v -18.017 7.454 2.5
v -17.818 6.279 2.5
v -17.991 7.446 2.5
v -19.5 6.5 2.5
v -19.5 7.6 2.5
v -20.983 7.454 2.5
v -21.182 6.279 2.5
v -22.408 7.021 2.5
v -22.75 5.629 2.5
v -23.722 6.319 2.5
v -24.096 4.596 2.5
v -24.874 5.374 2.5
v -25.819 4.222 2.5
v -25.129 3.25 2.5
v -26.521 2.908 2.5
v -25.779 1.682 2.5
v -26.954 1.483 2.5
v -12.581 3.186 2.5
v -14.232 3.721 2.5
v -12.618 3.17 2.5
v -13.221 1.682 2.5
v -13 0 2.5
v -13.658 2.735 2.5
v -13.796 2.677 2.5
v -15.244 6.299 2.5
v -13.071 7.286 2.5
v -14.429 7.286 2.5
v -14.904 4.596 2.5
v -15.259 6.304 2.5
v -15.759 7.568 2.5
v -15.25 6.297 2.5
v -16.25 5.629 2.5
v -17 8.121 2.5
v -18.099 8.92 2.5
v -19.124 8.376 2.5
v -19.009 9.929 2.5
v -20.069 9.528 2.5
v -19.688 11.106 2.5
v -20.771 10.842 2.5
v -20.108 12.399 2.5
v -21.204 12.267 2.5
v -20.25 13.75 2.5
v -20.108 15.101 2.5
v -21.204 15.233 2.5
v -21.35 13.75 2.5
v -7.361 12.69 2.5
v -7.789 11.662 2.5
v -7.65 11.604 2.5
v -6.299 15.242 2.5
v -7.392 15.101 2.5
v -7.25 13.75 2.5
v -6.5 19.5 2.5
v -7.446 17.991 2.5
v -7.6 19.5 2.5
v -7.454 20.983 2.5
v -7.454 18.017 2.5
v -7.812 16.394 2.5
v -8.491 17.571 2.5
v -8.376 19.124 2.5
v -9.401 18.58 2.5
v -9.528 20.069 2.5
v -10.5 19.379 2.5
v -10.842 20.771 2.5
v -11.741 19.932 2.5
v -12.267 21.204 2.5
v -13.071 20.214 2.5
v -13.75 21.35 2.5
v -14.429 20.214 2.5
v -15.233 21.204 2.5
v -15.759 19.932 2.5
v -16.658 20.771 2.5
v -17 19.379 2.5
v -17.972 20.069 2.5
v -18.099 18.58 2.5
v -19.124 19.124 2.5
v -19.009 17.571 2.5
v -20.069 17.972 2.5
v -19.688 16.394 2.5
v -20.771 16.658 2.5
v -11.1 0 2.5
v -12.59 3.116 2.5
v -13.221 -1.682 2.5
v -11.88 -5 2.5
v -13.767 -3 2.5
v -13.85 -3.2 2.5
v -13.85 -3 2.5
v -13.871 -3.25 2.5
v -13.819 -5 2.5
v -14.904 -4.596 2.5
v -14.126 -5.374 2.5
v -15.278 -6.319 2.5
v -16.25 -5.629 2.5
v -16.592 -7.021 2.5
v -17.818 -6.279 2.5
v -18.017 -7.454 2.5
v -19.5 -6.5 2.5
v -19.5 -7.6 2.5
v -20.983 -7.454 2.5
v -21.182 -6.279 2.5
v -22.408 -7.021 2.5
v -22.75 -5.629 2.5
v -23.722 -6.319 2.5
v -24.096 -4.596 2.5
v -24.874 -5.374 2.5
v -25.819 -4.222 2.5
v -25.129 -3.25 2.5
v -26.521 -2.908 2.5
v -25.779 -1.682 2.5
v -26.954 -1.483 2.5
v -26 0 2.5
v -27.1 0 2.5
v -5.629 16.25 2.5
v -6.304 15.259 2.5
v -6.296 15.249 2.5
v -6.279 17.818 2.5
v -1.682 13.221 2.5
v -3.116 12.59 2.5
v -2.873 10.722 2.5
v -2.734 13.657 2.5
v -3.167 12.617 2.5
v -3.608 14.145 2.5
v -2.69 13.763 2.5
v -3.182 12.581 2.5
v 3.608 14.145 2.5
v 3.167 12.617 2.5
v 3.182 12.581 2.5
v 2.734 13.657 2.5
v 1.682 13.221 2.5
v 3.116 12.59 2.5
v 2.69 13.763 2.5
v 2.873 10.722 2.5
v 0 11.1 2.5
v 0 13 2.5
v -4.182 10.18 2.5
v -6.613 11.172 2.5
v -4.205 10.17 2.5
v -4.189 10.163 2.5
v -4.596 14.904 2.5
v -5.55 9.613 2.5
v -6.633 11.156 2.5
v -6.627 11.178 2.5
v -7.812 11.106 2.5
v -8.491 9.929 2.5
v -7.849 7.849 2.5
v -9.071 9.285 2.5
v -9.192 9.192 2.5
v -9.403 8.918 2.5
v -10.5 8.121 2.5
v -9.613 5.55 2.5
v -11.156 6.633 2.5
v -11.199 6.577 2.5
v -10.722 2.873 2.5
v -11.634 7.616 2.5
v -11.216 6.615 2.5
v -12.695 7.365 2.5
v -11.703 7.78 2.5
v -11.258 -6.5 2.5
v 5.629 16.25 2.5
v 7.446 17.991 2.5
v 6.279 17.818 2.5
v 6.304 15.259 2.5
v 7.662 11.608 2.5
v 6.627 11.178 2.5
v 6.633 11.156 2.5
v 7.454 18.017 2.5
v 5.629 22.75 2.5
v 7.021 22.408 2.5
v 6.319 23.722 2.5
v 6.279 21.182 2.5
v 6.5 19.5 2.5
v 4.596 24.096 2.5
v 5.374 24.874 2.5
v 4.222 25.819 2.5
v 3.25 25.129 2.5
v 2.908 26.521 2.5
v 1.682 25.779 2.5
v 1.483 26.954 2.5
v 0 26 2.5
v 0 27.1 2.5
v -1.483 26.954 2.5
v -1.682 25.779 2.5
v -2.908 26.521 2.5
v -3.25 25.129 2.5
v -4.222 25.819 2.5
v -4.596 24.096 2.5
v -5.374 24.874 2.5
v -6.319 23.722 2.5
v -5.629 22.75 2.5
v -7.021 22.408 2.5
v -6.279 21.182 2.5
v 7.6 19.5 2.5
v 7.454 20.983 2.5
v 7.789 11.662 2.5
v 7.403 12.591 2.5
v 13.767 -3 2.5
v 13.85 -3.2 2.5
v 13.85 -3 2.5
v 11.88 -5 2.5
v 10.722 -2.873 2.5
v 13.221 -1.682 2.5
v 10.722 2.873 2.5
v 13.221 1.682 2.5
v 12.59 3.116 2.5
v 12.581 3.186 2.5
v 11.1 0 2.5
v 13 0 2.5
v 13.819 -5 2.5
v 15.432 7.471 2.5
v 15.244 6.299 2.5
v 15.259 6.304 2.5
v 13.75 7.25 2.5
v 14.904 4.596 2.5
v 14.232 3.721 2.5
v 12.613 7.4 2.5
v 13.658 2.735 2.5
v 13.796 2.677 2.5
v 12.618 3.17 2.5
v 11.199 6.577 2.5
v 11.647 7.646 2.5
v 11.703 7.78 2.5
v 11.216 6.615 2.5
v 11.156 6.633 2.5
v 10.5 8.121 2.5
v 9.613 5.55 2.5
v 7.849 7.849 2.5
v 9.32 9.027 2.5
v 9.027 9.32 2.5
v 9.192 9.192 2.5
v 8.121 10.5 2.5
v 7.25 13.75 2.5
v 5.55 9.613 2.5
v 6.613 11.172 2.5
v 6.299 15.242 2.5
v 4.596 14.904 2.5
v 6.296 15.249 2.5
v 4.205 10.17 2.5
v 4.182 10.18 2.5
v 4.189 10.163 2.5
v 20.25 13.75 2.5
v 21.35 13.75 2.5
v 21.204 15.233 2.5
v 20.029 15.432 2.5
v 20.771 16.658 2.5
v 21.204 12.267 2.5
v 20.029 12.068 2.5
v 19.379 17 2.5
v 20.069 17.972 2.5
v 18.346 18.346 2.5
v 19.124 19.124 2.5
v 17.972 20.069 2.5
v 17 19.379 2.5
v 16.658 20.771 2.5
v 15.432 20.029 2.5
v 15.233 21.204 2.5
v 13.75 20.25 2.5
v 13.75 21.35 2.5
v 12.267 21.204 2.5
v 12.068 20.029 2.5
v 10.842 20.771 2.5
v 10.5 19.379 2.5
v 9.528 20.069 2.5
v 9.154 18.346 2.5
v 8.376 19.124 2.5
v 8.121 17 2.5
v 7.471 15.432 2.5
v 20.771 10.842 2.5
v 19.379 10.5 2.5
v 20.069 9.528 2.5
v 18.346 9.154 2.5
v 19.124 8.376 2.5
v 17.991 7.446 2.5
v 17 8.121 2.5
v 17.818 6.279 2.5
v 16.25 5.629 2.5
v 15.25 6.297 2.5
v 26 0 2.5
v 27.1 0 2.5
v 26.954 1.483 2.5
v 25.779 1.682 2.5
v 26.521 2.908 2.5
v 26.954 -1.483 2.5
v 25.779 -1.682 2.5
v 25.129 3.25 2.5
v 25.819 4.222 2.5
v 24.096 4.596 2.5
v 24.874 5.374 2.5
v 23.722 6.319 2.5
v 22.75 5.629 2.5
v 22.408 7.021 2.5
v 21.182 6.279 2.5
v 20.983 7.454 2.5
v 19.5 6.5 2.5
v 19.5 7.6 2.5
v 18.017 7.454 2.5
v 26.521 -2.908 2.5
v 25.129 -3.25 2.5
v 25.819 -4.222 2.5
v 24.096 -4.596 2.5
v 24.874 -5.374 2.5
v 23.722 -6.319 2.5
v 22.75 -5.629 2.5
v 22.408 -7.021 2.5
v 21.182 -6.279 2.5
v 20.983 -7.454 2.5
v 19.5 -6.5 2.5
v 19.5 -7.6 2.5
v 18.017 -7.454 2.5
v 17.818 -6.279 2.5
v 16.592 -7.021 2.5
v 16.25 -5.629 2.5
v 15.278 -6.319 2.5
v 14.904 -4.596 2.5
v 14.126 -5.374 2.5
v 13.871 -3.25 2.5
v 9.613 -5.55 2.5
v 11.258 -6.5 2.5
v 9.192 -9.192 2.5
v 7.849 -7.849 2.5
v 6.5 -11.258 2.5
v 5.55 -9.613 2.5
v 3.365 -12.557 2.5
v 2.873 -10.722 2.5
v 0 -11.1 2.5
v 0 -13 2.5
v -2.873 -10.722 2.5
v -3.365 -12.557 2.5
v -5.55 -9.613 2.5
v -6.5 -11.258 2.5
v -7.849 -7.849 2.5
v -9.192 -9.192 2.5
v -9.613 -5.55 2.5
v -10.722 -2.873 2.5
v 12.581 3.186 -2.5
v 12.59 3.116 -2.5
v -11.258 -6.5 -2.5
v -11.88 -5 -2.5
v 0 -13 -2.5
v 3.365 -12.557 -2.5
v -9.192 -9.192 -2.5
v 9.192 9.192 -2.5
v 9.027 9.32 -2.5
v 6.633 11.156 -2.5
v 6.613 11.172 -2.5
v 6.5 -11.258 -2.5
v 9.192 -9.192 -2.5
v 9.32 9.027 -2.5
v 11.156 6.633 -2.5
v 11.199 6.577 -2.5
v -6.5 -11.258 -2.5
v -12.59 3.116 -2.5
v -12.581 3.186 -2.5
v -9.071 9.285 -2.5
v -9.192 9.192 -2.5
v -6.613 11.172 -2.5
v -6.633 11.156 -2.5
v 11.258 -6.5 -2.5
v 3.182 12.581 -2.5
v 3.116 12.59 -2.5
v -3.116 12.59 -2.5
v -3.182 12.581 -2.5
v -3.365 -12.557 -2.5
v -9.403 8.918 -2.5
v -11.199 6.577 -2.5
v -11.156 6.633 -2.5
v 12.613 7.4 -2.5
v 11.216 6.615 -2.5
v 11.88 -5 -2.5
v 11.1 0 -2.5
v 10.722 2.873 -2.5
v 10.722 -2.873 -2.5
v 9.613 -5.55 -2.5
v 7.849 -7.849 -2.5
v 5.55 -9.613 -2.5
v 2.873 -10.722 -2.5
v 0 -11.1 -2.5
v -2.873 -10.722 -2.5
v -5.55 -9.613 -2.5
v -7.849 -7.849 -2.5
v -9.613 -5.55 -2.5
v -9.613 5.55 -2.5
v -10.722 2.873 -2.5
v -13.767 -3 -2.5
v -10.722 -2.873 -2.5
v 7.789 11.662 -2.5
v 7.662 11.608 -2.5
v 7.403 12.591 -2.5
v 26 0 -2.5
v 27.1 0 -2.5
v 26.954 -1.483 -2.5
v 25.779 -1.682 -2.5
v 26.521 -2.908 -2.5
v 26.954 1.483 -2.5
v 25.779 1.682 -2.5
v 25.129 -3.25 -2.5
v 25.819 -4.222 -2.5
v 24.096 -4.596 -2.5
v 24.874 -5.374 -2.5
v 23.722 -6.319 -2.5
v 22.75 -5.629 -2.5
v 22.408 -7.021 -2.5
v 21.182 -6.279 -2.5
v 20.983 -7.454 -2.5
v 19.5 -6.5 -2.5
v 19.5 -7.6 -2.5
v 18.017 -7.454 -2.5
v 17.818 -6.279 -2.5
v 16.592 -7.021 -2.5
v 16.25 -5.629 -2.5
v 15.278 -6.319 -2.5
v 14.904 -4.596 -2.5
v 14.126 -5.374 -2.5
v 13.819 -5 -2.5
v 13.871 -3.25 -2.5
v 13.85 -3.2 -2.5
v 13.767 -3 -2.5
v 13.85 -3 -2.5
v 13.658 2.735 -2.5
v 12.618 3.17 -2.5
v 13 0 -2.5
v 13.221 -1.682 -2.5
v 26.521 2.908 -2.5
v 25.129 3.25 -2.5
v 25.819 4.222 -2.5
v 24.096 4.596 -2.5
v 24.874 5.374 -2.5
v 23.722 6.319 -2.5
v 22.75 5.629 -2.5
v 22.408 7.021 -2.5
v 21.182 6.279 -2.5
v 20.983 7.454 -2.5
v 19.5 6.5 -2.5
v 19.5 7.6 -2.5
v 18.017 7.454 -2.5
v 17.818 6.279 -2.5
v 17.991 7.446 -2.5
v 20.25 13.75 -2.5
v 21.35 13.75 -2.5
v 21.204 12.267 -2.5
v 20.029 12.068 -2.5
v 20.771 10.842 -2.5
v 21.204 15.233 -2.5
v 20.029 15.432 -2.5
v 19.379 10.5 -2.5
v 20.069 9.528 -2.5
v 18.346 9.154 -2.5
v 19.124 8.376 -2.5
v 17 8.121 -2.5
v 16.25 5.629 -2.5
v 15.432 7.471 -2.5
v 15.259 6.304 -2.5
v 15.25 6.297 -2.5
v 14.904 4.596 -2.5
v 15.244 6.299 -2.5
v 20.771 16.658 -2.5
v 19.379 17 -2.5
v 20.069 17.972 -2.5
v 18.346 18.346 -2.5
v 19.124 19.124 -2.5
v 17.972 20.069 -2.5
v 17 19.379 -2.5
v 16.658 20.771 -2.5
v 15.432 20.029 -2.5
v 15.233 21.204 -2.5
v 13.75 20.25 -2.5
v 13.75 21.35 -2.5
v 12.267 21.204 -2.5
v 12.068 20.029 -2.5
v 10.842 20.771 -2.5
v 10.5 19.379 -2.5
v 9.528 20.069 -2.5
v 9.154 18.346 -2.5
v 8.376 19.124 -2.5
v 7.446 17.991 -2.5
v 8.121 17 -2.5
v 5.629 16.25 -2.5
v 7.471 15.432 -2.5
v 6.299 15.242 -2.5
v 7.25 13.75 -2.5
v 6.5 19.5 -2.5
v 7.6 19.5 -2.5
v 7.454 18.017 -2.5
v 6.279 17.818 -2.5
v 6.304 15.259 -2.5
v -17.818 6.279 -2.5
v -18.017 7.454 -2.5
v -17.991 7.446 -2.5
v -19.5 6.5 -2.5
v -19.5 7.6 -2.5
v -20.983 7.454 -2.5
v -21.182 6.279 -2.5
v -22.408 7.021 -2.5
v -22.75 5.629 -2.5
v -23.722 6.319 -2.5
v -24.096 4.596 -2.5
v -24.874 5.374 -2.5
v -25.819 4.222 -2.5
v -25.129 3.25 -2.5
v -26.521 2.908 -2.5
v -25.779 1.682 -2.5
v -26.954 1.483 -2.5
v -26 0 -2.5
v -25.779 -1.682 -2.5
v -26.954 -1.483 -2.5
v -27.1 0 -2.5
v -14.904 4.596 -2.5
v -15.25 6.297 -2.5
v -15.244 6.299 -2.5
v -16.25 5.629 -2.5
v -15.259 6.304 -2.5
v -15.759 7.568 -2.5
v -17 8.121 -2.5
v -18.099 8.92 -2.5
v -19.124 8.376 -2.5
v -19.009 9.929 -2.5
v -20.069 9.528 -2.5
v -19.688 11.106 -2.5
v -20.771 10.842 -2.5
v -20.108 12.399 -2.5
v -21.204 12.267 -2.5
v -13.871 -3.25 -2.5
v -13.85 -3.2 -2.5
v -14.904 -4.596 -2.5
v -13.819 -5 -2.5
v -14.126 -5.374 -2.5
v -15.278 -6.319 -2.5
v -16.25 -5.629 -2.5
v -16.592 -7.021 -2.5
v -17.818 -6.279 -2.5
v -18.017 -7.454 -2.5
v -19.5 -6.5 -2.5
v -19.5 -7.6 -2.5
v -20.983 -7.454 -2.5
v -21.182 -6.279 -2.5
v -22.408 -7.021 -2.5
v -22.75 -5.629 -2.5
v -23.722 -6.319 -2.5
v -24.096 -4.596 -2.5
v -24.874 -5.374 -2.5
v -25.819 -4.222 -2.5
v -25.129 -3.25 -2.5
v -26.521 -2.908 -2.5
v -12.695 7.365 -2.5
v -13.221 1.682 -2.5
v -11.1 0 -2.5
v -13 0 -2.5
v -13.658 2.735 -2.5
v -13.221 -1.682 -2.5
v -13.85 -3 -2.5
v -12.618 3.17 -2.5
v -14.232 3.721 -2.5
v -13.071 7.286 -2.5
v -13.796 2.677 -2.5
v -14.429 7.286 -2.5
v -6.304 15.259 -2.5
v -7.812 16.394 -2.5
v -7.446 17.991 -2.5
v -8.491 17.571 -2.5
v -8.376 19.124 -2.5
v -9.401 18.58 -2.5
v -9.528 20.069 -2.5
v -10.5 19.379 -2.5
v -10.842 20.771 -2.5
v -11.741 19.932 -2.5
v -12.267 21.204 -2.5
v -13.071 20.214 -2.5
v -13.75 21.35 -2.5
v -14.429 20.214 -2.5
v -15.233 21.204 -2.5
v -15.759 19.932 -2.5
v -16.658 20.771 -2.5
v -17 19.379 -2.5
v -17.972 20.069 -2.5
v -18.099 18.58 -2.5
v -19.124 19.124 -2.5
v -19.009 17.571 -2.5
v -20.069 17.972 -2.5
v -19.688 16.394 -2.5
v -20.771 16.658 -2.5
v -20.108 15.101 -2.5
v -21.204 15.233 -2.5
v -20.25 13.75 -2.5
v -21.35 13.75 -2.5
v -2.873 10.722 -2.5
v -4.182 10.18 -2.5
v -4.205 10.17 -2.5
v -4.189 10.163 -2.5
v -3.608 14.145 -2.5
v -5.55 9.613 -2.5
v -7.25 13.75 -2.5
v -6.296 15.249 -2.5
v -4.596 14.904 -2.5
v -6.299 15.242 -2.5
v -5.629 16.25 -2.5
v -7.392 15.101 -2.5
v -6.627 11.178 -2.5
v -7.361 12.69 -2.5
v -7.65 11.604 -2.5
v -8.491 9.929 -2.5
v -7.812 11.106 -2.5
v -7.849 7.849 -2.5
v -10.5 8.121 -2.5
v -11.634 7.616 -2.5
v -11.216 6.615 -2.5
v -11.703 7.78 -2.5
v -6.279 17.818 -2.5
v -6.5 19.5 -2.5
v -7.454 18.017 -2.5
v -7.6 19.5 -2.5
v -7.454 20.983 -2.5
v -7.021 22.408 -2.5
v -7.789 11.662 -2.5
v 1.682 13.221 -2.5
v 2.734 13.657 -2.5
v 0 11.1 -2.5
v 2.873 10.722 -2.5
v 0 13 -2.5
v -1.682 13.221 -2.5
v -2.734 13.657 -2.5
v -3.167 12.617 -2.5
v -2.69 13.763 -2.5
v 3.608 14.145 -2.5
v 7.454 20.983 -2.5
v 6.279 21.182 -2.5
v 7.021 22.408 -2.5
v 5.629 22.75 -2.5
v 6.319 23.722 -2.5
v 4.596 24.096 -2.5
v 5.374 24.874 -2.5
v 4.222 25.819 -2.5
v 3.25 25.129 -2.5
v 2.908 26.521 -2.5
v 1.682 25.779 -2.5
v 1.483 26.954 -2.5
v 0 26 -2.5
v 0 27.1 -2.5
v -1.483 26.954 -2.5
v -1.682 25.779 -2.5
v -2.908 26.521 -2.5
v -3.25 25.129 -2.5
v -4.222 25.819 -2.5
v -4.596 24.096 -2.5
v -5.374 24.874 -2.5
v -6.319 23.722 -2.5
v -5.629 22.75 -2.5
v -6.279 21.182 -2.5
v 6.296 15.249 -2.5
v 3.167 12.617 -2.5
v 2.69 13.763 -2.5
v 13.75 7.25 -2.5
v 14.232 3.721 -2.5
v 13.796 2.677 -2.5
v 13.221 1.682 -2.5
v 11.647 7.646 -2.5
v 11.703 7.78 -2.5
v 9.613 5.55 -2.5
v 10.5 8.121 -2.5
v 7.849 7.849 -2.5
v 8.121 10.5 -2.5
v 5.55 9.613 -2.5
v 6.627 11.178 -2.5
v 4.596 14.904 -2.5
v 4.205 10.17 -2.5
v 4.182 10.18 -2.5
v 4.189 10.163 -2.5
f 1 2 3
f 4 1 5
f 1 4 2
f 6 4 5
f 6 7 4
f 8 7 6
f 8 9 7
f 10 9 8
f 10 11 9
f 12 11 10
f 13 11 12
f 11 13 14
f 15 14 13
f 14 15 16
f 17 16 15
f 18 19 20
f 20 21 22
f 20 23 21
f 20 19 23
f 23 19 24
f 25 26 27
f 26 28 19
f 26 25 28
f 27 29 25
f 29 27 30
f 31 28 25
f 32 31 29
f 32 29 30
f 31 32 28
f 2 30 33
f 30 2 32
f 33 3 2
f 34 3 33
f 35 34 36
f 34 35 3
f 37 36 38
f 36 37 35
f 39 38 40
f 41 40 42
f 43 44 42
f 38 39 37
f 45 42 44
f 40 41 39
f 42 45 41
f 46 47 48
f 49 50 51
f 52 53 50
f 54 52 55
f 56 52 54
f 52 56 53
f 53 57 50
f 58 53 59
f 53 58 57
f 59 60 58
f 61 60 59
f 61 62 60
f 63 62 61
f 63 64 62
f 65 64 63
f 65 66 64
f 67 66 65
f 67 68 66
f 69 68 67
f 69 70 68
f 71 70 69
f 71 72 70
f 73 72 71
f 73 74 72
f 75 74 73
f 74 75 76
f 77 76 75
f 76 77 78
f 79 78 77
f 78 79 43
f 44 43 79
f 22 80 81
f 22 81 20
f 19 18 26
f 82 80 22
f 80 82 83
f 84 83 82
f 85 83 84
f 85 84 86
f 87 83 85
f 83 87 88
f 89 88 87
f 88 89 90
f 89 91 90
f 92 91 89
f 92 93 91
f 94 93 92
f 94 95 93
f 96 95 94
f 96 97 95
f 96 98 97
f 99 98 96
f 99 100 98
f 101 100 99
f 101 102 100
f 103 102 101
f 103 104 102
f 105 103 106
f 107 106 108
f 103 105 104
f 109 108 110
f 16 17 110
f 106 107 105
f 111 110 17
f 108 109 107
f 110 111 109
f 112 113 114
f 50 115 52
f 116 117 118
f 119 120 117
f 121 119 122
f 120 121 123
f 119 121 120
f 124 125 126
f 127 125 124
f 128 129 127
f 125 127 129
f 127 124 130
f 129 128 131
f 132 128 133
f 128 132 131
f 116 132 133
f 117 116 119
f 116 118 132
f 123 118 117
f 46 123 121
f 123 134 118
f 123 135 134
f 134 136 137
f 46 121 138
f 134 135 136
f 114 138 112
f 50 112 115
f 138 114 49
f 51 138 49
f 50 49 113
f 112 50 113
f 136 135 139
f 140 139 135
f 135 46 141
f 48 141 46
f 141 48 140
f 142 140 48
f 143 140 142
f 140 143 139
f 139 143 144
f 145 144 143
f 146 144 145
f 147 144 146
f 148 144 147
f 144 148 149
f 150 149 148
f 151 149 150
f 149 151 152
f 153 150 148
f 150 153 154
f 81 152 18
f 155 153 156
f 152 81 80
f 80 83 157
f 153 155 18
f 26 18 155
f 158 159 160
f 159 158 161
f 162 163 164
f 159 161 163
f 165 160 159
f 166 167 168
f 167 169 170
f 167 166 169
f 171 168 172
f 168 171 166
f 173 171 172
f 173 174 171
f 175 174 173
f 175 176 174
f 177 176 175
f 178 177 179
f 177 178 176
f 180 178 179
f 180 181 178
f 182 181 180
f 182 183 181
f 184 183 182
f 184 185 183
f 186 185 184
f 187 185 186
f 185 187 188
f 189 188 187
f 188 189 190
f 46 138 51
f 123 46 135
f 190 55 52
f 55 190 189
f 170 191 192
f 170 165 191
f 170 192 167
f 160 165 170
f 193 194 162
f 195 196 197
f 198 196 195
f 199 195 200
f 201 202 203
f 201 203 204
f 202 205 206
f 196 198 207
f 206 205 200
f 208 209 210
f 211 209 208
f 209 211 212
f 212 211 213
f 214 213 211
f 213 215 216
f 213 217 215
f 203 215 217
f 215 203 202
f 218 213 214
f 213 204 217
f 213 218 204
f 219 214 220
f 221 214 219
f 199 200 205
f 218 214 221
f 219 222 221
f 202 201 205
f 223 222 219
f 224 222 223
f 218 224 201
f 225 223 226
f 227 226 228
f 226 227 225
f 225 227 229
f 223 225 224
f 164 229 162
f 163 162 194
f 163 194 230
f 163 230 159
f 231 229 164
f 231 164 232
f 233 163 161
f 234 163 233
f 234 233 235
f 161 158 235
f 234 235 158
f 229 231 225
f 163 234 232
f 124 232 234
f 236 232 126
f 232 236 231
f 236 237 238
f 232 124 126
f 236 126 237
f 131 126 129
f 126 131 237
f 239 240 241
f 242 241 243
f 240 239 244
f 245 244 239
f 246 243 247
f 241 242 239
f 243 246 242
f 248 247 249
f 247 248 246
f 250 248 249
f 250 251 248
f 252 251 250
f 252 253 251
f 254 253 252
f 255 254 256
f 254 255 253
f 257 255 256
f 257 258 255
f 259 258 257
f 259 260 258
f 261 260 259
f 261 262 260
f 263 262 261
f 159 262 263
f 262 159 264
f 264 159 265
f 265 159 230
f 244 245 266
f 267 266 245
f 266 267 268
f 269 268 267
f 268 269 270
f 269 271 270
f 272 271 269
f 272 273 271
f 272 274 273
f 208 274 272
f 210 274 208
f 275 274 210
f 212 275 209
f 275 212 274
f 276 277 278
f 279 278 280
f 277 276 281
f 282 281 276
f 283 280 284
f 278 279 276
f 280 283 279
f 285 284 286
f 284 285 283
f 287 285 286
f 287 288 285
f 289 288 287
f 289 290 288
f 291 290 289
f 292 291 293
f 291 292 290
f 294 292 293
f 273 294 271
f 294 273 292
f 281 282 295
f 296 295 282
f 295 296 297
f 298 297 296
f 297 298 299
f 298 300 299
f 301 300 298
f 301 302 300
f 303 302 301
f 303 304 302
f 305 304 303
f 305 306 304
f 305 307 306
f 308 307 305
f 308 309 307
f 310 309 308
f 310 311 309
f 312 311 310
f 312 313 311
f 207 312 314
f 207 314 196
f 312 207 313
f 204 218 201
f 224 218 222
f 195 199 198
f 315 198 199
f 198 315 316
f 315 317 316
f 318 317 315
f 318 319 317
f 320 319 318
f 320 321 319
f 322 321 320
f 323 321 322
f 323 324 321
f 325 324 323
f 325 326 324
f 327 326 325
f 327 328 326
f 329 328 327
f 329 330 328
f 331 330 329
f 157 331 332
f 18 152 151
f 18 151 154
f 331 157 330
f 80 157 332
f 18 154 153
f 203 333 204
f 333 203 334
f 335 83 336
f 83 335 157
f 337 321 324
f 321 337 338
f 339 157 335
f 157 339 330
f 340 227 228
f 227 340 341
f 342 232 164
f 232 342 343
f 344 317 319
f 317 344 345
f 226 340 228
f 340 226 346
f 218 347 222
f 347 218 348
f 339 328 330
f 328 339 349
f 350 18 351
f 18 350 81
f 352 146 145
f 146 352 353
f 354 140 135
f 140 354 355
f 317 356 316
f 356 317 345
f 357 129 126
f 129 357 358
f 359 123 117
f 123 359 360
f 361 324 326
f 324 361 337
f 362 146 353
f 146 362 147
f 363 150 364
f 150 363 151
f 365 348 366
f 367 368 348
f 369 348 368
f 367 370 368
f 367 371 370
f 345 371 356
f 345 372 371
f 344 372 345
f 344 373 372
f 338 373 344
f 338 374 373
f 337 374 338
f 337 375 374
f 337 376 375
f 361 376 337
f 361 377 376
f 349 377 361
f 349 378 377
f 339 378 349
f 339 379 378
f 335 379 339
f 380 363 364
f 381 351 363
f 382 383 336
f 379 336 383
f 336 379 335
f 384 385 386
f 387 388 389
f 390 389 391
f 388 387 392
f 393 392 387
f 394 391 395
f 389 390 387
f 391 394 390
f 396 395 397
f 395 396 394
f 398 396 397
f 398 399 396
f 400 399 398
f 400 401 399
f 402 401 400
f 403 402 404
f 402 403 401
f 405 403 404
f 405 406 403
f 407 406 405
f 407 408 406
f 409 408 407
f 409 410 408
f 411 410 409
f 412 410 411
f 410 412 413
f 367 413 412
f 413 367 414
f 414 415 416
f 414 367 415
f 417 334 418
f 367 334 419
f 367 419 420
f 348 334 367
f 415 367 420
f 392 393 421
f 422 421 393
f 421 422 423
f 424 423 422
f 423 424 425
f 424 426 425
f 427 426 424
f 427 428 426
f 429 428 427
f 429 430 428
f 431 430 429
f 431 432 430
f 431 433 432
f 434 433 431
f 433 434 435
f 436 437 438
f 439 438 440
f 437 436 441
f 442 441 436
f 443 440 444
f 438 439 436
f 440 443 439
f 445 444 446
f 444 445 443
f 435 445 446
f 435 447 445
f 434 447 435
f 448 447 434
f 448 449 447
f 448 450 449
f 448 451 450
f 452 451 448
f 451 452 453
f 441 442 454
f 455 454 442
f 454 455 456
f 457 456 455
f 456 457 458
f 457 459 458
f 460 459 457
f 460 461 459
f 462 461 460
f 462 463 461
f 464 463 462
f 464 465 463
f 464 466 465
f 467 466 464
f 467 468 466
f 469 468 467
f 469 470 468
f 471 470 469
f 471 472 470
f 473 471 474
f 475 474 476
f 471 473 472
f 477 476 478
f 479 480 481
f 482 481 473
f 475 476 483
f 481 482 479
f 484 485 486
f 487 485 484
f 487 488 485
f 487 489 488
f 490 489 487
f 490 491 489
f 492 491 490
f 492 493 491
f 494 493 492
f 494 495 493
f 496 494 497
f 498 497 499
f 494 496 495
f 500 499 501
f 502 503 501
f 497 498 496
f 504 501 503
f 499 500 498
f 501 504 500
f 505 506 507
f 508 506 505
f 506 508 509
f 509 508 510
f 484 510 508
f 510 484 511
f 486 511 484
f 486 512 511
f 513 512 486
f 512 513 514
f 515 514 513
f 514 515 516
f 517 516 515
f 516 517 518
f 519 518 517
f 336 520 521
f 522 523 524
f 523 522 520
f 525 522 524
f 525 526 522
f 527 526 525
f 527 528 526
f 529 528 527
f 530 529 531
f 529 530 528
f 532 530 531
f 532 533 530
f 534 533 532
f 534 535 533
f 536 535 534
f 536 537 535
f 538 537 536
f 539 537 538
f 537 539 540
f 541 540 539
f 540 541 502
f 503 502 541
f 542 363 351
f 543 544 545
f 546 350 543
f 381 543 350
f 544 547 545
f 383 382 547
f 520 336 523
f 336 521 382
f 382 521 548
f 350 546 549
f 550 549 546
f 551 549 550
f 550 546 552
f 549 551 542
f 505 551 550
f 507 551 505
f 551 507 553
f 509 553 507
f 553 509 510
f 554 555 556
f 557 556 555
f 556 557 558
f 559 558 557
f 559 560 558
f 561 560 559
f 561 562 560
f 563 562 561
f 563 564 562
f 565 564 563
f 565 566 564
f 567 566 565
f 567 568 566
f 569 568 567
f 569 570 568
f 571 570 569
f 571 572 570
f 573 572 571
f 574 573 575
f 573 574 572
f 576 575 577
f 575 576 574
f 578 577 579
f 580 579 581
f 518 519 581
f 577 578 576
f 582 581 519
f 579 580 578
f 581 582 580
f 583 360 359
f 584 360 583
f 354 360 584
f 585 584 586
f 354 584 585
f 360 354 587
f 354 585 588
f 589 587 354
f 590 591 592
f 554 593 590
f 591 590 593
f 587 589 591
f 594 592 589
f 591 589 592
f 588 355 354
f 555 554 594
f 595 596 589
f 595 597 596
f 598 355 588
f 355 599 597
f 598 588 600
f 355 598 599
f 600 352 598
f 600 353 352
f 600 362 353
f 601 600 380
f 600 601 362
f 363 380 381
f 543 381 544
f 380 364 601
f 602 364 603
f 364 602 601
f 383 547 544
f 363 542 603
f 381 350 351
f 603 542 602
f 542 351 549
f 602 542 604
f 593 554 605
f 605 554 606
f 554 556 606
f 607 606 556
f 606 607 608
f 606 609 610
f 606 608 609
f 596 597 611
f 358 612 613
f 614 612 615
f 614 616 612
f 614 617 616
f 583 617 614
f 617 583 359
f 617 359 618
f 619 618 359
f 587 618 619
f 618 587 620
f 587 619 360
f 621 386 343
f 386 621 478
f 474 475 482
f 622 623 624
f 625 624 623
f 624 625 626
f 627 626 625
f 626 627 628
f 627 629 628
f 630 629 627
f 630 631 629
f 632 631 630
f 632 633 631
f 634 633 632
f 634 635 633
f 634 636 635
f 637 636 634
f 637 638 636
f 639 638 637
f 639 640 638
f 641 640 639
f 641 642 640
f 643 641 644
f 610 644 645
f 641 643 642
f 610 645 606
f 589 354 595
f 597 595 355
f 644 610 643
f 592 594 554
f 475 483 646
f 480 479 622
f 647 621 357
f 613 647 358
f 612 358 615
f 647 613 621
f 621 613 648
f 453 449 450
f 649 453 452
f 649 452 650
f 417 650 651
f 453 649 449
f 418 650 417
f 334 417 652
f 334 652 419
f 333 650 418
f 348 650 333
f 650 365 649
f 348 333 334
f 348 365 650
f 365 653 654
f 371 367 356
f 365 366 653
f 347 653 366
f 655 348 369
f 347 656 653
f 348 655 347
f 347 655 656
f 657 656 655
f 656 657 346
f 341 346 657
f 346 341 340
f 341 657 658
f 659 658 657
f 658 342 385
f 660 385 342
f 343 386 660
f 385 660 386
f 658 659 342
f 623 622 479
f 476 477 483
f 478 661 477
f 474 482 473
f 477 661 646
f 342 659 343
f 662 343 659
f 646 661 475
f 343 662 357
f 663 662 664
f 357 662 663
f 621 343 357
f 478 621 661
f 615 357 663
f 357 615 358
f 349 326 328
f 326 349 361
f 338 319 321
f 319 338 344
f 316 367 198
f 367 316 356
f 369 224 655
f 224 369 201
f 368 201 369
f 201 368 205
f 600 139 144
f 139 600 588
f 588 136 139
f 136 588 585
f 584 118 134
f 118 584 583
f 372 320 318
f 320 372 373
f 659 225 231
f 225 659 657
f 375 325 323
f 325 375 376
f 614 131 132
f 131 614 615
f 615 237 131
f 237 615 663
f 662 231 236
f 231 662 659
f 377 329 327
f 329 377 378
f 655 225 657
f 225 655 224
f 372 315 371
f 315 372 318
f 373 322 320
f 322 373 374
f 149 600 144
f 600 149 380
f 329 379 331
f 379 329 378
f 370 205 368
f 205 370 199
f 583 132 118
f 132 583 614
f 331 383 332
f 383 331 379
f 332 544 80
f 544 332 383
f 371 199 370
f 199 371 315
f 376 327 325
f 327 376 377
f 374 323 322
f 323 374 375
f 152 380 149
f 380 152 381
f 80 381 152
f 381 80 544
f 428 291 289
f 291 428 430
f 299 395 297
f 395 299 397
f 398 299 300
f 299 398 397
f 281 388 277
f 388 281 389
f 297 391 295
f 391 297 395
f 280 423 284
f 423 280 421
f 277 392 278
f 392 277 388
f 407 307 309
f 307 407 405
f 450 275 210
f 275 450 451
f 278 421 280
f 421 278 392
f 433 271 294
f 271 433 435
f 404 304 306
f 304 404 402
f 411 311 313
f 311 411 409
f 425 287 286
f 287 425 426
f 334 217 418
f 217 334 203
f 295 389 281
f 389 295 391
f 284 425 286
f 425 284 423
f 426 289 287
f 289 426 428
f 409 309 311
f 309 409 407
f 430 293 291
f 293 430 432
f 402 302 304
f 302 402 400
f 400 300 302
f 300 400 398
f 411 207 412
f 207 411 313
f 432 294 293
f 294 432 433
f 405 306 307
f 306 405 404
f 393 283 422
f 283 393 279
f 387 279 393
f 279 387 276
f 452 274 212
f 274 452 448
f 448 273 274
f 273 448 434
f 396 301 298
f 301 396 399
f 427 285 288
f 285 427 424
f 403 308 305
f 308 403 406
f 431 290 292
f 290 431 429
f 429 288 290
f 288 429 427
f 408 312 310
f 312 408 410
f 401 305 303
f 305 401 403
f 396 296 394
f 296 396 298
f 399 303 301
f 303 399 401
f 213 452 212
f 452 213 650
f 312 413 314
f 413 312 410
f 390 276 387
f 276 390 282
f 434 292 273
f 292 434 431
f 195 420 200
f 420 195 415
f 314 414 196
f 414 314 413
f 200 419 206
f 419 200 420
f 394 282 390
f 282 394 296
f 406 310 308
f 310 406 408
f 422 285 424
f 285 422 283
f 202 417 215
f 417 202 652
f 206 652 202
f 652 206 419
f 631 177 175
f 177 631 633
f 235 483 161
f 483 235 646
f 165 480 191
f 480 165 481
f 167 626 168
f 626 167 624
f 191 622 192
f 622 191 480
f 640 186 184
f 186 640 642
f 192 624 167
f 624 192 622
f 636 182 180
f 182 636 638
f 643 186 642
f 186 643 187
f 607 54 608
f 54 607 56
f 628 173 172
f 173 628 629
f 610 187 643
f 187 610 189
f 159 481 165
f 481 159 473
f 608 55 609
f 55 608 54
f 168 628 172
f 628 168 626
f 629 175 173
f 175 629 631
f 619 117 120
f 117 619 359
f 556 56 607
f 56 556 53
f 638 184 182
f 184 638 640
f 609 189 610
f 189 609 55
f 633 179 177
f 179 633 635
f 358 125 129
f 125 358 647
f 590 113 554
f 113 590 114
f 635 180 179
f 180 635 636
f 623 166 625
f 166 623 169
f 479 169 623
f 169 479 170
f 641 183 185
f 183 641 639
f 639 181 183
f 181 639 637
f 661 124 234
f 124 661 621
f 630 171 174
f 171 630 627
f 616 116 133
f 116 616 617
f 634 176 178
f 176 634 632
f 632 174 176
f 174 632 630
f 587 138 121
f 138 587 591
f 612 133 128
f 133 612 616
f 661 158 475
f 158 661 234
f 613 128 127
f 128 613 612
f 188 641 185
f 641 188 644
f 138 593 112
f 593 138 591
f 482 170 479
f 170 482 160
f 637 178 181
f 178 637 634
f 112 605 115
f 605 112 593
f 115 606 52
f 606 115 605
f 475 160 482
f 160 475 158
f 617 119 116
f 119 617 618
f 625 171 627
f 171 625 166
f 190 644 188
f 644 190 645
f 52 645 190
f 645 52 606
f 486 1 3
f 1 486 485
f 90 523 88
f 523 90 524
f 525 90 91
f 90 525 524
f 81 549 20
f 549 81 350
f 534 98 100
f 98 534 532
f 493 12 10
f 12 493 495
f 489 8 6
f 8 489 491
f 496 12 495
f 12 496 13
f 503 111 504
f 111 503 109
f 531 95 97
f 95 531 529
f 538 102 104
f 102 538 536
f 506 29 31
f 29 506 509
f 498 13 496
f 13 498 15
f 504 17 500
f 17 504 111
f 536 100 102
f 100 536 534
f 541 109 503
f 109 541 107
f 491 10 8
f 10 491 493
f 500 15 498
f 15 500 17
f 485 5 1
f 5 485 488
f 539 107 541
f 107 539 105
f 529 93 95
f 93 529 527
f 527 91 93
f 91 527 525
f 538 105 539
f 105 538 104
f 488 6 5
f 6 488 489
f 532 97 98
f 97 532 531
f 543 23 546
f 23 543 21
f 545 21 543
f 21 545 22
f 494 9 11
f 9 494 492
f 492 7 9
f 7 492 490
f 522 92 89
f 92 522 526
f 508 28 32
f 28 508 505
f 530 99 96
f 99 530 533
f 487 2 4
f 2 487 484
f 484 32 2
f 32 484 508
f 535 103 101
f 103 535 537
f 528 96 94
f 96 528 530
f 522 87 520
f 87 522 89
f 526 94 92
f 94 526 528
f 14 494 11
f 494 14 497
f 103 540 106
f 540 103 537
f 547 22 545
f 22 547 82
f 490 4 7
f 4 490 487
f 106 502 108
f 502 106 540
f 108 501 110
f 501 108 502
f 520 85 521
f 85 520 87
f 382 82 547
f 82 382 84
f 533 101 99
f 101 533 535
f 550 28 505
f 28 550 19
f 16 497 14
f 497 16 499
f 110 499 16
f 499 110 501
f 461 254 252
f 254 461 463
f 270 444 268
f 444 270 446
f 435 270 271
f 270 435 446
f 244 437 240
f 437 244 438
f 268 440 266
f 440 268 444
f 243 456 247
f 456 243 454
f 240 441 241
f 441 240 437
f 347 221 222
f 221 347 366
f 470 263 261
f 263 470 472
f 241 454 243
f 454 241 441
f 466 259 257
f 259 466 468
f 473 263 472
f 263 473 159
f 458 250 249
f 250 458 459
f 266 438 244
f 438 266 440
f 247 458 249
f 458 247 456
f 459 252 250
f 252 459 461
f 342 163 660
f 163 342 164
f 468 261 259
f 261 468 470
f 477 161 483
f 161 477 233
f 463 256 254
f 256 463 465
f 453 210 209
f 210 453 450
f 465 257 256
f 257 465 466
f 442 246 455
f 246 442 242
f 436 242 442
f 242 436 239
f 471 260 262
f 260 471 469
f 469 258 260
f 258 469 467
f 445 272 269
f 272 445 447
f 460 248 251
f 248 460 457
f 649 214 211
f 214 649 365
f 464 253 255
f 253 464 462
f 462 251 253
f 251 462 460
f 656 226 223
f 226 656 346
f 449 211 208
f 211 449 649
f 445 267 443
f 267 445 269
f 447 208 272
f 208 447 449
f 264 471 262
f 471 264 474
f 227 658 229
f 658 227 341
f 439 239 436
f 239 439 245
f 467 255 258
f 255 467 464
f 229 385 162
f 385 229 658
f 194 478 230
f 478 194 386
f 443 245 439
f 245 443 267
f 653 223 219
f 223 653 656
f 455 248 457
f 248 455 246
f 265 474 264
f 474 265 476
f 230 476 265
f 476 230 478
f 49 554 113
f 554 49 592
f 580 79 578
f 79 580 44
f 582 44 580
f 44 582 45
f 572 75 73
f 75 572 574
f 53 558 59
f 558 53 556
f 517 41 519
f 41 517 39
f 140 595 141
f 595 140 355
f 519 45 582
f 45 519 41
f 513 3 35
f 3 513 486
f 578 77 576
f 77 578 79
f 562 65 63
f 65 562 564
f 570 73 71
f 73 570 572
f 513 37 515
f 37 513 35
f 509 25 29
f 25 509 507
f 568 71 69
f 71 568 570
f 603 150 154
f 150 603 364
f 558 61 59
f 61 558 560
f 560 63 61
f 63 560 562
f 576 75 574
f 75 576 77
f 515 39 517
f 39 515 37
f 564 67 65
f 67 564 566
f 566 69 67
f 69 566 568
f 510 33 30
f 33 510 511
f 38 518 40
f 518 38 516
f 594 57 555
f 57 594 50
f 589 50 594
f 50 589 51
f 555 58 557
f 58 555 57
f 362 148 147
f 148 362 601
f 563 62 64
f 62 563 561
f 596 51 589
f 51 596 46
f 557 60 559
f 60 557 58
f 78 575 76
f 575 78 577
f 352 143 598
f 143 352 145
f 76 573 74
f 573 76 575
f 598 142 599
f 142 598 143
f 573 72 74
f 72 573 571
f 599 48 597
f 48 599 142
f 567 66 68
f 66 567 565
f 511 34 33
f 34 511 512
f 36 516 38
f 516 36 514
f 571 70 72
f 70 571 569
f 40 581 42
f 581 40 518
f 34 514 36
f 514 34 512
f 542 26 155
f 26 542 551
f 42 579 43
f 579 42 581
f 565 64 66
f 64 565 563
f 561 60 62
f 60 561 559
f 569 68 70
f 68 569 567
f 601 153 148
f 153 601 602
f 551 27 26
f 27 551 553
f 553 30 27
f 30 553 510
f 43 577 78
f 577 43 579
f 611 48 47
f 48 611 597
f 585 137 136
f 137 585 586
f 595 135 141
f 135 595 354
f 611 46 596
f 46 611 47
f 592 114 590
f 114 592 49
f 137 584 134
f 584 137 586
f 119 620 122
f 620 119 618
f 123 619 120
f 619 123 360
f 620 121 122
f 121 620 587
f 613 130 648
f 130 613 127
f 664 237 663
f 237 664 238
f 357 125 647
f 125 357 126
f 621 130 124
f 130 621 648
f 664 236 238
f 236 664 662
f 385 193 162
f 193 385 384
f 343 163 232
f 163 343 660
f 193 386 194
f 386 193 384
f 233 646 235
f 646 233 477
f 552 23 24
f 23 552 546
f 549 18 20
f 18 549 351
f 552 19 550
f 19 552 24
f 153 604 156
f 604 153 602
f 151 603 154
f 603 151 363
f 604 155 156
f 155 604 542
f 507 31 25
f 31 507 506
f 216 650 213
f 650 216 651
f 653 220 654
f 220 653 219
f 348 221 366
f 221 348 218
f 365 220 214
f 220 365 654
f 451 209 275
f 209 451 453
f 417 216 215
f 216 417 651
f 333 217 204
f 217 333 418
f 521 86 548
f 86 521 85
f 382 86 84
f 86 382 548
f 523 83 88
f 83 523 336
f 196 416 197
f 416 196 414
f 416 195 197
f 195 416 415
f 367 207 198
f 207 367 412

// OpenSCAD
union() {
  difference() {
    cylinder(r=13,h=5, center=true, $fn=24);
    cylinder(r=11.1, h=5.5, center=true, $fn=24);
  }
  translate([19.5,0,0])
  difference() {
    cylinder(r=7.6, h=5, center=true, $fn=32);
    translate([0, 0, -5])
    cylinder(r=6.5, h=10, cether=true, $fn=24);
  }
  translate([0,19.5,0])
  difference() {
    cylinder(r=7.6, h=5, center=true, $fn=32);
    translate([0, 0, -5])
    cylinder(r=6.5, h=10, cether=true, $fn=24);
  }
  translate([-19.5,0,0])
  difference() {
    cylinder(r=7.6, h=5, center=true, $fn=32);
    translate([0, 0, -5])
    cylinder(r=6.5, h=10, cether=true, $fn=24);
  }
  translate([13.75,13.75,0])
  difference() {
    cylinder(r=7.6, h=5, center=true, $fn=32);
    translate([0, 0, -5])
    cylinder(r=6.5, h=10, cether=true, $fn=24);
  }
  translate([-13.75,13.75,0])
  difference() {
    cylinder(r=7.6, h=5, center=true, $fn=32);
    translate([0, 0, -5])
    cylinder(r=6.5, h=10, cether=true, $fn=30);
  }
  
  rotate(22.4)
  translate([0,13.75,0])
  rotate(45)
  cube([3.9, 3.9, 5], center=true);
  rotate(-22.4)
  translate([0,13.75,0])
  rotate(45)
  cube([3.9, 3.9, 5], center=true);
  rotate(67.7)
  translate([0,13.78,0])
  rotate(45)
  cube([3.9, 3.9, 5], center=true);
  rotate(-67.7)
  translate([0,13.78,0])
  rotate(45)
  cube([3.9, 3.9, 5], center=true);
 
  translate([-12.6, -4, 0])
  cube([2.5, 2, 5], center=true);
  translate([12.6, -4, 0])
  cube([2.5, 2, 5], center=true);
}
